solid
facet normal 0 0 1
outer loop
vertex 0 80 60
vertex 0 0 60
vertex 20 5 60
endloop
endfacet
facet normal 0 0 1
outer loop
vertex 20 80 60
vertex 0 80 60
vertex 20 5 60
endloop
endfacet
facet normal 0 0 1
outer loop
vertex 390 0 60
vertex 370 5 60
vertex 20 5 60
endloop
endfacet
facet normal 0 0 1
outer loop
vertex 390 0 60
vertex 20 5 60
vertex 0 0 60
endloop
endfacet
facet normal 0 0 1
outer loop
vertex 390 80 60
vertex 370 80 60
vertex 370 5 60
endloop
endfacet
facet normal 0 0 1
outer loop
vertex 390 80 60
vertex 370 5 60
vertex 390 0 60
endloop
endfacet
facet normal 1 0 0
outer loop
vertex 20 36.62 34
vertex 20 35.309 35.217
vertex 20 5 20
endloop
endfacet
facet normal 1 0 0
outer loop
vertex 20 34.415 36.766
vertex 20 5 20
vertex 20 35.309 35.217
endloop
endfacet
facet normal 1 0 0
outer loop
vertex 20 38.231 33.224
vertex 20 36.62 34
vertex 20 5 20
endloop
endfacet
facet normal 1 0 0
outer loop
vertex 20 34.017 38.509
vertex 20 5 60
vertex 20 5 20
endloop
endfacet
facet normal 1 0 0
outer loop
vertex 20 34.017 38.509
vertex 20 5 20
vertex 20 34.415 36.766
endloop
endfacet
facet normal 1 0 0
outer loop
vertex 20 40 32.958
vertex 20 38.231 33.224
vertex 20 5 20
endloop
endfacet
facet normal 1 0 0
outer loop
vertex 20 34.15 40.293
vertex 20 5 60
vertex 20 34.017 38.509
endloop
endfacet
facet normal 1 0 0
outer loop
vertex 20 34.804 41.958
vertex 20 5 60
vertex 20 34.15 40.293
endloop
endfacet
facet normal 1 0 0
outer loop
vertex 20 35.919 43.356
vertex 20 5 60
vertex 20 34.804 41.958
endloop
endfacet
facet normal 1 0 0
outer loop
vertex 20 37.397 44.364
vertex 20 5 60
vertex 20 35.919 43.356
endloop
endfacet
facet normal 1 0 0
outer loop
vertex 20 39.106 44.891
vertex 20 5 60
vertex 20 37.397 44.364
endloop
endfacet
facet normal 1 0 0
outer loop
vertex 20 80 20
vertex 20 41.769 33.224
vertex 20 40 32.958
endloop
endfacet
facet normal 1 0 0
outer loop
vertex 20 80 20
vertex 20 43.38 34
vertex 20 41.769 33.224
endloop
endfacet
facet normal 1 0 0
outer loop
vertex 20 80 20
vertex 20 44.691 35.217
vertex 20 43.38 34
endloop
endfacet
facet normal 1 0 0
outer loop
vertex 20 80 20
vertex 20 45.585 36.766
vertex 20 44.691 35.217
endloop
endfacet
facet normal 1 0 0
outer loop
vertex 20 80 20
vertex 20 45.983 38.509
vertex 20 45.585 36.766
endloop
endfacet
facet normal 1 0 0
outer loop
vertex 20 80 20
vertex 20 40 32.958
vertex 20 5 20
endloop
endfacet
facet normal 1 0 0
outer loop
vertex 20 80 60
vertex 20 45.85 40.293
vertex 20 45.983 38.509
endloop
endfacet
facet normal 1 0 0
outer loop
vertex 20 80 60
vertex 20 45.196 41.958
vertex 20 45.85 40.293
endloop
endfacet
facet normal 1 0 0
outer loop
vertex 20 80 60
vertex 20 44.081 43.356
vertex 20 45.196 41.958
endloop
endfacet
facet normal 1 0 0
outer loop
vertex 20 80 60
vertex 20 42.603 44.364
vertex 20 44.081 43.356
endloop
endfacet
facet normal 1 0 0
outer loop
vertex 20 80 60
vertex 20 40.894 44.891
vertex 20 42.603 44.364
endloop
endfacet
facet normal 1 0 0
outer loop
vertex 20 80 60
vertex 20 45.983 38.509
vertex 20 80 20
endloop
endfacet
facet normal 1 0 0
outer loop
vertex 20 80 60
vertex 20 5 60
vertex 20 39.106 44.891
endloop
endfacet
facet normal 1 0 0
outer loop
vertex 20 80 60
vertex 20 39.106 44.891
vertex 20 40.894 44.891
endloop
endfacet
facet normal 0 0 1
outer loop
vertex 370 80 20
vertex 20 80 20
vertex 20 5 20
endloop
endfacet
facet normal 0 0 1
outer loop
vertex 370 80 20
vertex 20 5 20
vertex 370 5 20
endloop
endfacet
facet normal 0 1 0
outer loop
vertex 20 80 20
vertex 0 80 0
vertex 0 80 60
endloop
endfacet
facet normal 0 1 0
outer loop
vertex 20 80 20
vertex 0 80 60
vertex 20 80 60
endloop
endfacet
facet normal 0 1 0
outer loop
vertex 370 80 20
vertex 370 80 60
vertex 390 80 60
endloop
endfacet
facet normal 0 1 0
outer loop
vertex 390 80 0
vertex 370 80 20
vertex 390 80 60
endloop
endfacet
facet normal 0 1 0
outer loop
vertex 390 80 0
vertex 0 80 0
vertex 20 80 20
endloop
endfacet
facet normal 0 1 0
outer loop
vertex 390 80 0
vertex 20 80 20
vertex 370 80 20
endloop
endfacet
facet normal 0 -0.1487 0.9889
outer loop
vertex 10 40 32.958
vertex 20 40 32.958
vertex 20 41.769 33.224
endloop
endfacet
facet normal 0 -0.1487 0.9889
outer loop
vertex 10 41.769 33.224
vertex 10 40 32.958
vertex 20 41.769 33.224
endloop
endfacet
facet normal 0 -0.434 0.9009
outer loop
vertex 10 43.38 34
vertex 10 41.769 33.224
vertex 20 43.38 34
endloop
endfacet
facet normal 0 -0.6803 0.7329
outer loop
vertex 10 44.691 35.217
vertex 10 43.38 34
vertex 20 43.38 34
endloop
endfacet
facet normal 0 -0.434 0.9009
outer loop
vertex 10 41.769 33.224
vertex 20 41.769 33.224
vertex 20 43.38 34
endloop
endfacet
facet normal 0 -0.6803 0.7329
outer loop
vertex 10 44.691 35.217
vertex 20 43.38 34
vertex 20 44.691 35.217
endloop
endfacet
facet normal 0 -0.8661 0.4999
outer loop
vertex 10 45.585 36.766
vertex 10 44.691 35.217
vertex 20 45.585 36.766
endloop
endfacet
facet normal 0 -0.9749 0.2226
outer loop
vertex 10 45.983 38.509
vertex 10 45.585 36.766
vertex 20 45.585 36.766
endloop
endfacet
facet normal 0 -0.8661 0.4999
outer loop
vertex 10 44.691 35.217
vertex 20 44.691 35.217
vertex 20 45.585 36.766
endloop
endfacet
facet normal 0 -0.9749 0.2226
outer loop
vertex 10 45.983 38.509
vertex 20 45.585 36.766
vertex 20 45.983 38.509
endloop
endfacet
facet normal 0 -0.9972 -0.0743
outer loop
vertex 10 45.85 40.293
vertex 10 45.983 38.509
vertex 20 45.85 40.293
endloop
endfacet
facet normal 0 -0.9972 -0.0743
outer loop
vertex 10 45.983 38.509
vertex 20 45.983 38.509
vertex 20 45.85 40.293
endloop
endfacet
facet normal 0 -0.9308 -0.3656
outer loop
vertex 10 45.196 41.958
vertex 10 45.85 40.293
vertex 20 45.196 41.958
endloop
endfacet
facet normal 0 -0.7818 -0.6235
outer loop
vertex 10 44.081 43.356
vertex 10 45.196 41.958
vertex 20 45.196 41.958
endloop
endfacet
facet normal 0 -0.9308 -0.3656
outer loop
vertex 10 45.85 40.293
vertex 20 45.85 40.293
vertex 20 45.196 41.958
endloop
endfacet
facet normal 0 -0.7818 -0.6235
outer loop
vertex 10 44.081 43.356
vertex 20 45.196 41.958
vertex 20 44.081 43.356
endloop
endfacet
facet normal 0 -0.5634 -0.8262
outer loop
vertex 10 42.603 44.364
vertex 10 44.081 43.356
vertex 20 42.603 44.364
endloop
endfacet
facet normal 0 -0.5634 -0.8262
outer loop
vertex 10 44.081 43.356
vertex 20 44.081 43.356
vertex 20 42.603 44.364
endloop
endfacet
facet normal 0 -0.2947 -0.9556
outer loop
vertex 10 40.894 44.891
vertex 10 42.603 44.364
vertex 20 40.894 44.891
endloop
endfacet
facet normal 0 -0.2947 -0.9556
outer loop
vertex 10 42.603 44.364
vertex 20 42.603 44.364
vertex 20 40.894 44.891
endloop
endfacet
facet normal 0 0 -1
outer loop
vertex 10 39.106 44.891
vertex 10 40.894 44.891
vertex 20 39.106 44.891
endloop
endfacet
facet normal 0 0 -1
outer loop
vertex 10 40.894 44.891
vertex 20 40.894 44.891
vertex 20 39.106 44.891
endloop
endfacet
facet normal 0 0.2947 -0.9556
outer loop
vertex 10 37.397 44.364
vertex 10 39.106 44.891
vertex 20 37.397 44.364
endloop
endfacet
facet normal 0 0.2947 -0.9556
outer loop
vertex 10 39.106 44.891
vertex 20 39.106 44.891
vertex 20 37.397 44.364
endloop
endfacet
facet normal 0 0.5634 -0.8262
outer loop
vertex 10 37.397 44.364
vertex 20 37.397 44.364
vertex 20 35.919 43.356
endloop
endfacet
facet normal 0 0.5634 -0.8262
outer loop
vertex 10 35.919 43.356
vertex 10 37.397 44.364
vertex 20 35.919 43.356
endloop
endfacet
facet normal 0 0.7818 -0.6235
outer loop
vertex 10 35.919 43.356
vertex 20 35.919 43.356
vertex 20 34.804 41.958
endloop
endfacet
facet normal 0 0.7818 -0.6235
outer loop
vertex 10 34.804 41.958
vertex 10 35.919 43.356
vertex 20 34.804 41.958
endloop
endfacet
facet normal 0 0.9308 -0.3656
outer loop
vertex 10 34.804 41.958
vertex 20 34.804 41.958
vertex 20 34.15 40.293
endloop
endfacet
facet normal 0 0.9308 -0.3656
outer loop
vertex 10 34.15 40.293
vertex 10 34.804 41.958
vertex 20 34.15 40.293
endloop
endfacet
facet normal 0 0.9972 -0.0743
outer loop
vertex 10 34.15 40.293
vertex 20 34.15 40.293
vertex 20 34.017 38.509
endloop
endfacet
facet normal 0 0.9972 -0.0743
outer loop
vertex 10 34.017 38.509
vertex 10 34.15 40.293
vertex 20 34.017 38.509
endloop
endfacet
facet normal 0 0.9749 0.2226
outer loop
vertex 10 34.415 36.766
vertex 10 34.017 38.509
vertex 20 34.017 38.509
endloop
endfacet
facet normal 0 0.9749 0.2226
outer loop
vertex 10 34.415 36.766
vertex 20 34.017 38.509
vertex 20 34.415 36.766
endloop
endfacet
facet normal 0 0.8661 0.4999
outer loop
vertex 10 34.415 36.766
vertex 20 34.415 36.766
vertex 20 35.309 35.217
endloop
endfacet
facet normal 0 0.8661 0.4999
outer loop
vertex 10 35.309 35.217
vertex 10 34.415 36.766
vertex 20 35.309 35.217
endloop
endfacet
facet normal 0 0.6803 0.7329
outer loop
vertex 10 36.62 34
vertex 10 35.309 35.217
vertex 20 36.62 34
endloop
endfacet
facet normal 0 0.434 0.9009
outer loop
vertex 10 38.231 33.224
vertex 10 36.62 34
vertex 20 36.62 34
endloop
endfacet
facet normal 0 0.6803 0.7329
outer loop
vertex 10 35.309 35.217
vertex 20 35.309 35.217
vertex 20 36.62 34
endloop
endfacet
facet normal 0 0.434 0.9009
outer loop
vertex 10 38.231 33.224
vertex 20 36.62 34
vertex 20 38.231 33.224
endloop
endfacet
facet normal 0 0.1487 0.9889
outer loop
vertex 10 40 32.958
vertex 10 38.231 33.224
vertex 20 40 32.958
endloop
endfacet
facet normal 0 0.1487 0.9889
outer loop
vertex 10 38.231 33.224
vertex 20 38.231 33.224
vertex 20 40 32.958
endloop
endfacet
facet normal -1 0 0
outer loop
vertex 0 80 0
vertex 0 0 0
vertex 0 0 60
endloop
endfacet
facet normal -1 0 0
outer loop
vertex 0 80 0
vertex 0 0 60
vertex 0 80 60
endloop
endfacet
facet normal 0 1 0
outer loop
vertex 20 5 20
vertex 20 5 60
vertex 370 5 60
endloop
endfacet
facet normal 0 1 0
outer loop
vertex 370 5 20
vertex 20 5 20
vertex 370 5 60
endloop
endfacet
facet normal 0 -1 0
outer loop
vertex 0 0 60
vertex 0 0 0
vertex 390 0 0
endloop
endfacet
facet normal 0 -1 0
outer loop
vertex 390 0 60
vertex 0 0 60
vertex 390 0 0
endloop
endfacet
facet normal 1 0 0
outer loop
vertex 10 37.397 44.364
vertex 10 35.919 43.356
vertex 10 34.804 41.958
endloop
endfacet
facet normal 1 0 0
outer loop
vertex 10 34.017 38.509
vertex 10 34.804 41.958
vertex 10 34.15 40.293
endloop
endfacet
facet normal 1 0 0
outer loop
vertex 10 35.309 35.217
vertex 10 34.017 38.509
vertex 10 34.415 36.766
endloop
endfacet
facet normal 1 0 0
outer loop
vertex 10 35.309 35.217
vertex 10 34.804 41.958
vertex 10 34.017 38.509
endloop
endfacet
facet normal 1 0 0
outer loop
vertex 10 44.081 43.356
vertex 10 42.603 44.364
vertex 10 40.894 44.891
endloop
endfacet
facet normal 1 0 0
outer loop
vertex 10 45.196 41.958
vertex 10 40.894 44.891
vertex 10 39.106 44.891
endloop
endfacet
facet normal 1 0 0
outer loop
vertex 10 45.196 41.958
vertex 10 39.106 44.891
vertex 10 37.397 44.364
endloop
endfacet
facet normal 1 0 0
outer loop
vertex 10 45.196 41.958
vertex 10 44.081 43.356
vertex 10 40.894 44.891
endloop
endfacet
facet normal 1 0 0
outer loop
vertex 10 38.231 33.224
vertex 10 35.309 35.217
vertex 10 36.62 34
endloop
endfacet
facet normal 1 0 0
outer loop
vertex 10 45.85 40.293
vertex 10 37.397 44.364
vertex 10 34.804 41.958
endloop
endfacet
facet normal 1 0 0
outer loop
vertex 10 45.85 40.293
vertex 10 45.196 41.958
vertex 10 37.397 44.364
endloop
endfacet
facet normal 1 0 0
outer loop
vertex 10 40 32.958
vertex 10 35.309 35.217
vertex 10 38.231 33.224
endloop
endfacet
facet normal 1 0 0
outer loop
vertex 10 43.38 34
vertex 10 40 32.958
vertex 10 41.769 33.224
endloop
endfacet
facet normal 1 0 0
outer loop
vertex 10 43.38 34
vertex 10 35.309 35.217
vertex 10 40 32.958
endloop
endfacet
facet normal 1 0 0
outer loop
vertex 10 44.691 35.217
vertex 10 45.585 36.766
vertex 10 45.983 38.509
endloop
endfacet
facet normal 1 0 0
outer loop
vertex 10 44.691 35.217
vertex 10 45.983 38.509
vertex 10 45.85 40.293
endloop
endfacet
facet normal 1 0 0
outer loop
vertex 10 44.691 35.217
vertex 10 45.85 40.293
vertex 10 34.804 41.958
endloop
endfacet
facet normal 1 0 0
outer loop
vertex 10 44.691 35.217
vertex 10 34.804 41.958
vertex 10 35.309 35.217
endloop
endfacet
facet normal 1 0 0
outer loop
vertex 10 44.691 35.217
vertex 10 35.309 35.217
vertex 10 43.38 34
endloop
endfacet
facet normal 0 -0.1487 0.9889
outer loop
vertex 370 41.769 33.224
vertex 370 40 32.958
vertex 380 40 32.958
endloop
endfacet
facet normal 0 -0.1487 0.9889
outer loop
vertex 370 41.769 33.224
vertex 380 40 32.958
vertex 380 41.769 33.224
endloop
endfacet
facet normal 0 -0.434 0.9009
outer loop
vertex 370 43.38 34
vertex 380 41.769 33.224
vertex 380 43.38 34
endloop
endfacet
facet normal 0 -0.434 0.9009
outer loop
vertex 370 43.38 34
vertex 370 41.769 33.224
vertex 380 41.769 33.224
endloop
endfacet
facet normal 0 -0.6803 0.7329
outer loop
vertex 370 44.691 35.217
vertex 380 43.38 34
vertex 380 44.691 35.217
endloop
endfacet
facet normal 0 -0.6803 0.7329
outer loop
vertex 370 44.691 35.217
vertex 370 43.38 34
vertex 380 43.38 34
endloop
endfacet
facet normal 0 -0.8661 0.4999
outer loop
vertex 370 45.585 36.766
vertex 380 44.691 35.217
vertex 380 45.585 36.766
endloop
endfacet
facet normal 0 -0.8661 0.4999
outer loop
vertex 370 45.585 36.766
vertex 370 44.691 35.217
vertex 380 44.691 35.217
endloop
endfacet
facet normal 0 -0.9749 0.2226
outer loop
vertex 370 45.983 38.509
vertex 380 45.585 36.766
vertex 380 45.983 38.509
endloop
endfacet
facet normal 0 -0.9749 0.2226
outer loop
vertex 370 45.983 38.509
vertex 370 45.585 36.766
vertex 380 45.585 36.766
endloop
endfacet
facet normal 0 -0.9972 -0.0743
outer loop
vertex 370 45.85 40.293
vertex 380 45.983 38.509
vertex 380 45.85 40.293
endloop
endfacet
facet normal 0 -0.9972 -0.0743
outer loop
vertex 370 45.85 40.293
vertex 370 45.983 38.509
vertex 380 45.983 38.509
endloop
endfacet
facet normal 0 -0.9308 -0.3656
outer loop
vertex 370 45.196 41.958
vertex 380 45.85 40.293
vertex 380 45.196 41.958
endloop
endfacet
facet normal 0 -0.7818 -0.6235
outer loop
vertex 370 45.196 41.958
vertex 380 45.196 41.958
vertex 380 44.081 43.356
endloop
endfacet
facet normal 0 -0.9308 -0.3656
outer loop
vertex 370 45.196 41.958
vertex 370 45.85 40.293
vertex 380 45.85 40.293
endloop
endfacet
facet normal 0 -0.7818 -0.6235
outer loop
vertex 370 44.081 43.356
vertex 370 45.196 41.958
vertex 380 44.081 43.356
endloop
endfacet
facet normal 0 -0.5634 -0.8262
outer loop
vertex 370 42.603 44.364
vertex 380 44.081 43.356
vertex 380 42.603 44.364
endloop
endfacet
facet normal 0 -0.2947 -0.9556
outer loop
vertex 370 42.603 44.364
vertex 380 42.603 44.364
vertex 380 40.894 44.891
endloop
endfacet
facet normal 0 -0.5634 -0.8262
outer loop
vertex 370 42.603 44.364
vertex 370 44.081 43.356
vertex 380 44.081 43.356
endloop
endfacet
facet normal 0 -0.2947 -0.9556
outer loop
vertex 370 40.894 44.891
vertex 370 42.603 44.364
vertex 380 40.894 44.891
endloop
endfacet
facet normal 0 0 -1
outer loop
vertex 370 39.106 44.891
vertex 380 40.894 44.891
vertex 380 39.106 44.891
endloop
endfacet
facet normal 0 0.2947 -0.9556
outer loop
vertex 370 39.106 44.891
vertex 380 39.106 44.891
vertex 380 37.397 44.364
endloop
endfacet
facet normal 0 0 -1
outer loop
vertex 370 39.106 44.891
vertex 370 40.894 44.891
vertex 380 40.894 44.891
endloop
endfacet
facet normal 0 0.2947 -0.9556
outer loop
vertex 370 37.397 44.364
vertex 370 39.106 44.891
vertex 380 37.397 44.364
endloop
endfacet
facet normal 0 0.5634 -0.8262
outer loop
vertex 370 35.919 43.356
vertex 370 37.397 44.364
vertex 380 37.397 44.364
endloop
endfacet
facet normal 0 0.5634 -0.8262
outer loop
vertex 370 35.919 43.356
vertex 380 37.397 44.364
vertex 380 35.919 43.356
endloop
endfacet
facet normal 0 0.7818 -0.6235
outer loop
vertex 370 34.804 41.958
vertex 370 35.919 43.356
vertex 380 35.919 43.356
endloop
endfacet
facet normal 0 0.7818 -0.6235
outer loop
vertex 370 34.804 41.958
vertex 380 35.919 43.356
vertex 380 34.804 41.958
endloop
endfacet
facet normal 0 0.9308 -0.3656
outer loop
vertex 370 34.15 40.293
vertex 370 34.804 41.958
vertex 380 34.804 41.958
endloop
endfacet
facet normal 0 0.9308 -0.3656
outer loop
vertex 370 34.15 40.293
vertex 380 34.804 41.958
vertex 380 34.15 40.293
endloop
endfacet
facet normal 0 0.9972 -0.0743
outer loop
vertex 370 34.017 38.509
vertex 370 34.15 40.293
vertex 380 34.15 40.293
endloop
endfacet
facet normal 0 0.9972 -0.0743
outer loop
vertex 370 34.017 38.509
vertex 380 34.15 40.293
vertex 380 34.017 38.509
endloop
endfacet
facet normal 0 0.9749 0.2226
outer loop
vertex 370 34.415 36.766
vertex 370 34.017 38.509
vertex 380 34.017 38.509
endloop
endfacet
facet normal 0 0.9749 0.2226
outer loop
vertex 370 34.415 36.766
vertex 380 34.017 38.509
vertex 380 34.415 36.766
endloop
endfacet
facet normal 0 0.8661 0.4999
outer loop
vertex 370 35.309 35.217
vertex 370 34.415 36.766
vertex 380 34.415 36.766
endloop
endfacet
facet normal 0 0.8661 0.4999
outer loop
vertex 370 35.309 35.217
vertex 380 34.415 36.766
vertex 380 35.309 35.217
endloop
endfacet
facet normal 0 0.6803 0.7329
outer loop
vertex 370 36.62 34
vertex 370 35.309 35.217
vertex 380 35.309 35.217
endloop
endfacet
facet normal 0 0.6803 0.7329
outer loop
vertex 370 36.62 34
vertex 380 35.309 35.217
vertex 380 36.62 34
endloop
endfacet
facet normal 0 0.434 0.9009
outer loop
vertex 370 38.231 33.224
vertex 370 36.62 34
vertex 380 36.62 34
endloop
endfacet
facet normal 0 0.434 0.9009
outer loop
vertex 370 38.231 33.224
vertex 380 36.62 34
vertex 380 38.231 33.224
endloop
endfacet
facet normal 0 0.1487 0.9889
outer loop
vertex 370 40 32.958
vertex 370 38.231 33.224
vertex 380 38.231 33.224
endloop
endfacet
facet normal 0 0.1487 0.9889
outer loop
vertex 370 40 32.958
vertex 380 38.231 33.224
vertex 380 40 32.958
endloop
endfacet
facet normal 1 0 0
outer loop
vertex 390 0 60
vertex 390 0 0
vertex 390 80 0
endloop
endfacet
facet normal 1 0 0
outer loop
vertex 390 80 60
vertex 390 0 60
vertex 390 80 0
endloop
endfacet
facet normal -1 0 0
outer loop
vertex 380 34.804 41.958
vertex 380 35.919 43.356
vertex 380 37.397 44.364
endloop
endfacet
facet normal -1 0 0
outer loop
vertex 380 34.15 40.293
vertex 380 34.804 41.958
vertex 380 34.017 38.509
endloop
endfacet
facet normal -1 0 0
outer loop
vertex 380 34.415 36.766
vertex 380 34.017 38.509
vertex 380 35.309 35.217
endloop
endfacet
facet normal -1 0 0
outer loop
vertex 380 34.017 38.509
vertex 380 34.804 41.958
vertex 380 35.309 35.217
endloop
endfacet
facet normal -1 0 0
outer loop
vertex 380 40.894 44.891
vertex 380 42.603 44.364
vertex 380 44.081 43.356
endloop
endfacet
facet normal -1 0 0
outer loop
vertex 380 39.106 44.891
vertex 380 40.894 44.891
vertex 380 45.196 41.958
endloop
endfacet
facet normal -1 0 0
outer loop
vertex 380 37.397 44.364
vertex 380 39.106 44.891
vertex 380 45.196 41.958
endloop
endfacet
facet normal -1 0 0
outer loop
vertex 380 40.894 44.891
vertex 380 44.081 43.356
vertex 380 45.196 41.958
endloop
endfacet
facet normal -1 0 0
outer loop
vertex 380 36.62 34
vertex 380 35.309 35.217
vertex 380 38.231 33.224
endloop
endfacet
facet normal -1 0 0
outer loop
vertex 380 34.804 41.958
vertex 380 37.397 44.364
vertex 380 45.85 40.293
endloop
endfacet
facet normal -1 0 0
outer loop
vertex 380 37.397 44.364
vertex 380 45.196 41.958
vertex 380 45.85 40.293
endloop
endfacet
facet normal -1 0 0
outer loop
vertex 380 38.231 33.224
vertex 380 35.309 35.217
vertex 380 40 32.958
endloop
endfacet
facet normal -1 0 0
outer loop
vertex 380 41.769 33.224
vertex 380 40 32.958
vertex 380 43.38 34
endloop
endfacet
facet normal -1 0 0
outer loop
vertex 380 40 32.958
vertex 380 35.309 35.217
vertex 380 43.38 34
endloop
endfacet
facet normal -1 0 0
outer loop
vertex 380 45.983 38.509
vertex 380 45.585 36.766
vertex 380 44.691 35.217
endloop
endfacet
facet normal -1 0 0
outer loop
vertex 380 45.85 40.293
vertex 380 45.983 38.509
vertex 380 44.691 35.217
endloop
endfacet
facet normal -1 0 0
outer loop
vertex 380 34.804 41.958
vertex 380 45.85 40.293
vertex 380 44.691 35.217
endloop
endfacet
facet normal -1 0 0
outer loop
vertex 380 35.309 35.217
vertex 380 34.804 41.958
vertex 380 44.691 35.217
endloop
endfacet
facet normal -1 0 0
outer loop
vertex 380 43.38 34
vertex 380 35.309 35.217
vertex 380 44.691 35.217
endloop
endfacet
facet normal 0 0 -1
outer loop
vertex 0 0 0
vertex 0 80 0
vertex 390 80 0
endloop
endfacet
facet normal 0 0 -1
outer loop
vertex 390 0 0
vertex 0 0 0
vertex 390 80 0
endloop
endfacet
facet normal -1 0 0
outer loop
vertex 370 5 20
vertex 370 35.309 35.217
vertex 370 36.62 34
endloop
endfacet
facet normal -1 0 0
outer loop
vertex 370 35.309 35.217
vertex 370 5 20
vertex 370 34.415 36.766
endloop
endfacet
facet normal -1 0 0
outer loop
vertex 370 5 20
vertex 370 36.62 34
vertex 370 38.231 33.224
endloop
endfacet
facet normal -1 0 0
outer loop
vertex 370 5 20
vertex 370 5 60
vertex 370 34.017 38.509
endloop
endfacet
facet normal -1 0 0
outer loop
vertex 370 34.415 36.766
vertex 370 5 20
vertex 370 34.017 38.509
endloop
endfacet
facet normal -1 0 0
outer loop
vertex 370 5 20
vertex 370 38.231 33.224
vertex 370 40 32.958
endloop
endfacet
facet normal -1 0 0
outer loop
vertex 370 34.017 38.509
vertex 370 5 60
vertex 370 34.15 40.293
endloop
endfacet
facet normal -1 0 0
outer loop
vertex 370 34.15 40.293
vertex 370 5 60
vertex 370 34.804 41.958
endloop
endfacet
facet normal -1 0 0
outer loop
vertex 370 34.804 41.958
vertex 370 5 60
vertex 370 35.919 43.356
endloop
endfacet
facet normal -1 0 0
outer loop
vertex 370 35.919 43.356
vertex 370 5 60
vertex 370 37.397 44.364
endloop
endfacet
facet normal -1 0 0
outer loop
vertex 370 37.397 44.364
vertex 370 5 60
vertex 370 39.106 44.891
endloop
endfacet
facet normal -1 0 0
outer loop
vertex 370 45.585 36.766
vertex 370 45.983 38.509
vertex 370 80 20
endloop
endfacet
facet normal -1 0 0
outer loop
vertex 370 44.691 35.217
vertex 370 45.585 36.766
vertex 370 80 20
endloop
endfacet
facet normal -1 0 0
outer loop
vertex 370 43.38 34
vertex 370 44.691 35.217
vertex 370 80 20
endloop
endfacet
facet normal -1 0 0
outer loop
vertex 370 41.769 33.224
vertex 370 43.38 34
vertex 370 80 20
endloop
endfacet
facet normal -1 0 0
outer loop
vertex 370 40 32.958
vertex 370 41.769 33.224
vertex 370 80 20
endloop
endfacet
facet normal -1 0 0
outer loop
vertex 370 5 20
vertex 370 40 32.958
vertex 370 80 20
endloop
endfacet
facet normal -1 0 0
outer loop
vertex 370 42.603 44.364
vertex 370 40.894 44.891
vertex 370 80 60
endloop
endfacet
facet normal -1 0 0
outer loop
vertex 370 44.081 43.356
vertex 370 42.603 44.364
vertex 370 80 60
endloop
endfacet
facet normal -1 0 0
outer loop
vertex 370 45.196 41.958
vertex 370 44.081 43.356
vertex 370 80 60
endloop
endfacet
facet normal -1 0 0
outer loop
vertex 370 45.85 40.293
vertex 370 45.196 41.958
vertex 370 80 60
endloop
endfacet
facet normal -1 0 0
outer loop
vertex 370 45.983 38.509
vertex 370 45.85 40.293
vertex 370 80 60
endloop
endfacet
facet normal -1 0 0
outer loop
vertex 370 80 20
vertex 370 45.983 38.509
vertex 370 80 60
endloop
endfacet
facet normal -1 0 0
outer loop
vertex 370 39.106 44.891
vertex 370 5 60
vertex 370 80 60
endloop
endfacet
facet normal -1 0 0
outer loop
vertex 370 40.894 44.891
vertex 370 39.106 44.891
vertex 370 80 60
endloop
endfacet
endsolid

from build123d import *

# Parameters (mm, degrees)
SKETCH2_W               = 390
SKETCH2_H               = 80
BOSS_EXTRUDE1_DEPTH     = 60
SKETCH4_W               = 350
SKETCH4_H               = 75
CUT_EXTRUDE1_DEPTH      = 40
SKETCH5_R               = 6
CUT_EXTRUDE2_DEPTH      = 360
CUT_EXTRUDE2_DEPTH_BACK = 10


with BuildPart() as part:
    # Sketch2 → Boss-Extrude1 (new body)
    with BuildSketch(Plane.XY):
        with Locations((195, 40)):
            Rectangle(SKETCH2_W, SKETCH2_H)
    extrude(amount=BOSS_EXTRUDE1_DEPTH)

    # Sketch4 → Cut-Extrude1 (cut)
    with BuildSketch(Plane.XY.offset(60)):
        with Locations((195, 42.5)):
            Rectangle(SKETCH4_W, SKETCH4_H)
    extrude(amount=-CUT_EXTRUDE1_DEPTH, mode=Mode.SUBTRACT)

    # Sketch5 → Cut-Extrude2 (cut, two sides)
    with BuildSketch(Plane(origin=(20, 0, 0), x_dir=(0, 0, -1), z_dir=(1, 0, 0))) as cut_extrude2_sk:
        with Locations((-38.957689145, 40)):
            Circle(SKETCH5_R)
    extrude(amount=CUT_EXTRUDE2_DEPTH, mode=Mode.SUBTRACT)
    extrude(cut_extrude2_sk.sketch, amount=-CUT_EXTRUDE2_DEPTH_BACK, mode=Mode.SUBTRACT)


solid = part.part
